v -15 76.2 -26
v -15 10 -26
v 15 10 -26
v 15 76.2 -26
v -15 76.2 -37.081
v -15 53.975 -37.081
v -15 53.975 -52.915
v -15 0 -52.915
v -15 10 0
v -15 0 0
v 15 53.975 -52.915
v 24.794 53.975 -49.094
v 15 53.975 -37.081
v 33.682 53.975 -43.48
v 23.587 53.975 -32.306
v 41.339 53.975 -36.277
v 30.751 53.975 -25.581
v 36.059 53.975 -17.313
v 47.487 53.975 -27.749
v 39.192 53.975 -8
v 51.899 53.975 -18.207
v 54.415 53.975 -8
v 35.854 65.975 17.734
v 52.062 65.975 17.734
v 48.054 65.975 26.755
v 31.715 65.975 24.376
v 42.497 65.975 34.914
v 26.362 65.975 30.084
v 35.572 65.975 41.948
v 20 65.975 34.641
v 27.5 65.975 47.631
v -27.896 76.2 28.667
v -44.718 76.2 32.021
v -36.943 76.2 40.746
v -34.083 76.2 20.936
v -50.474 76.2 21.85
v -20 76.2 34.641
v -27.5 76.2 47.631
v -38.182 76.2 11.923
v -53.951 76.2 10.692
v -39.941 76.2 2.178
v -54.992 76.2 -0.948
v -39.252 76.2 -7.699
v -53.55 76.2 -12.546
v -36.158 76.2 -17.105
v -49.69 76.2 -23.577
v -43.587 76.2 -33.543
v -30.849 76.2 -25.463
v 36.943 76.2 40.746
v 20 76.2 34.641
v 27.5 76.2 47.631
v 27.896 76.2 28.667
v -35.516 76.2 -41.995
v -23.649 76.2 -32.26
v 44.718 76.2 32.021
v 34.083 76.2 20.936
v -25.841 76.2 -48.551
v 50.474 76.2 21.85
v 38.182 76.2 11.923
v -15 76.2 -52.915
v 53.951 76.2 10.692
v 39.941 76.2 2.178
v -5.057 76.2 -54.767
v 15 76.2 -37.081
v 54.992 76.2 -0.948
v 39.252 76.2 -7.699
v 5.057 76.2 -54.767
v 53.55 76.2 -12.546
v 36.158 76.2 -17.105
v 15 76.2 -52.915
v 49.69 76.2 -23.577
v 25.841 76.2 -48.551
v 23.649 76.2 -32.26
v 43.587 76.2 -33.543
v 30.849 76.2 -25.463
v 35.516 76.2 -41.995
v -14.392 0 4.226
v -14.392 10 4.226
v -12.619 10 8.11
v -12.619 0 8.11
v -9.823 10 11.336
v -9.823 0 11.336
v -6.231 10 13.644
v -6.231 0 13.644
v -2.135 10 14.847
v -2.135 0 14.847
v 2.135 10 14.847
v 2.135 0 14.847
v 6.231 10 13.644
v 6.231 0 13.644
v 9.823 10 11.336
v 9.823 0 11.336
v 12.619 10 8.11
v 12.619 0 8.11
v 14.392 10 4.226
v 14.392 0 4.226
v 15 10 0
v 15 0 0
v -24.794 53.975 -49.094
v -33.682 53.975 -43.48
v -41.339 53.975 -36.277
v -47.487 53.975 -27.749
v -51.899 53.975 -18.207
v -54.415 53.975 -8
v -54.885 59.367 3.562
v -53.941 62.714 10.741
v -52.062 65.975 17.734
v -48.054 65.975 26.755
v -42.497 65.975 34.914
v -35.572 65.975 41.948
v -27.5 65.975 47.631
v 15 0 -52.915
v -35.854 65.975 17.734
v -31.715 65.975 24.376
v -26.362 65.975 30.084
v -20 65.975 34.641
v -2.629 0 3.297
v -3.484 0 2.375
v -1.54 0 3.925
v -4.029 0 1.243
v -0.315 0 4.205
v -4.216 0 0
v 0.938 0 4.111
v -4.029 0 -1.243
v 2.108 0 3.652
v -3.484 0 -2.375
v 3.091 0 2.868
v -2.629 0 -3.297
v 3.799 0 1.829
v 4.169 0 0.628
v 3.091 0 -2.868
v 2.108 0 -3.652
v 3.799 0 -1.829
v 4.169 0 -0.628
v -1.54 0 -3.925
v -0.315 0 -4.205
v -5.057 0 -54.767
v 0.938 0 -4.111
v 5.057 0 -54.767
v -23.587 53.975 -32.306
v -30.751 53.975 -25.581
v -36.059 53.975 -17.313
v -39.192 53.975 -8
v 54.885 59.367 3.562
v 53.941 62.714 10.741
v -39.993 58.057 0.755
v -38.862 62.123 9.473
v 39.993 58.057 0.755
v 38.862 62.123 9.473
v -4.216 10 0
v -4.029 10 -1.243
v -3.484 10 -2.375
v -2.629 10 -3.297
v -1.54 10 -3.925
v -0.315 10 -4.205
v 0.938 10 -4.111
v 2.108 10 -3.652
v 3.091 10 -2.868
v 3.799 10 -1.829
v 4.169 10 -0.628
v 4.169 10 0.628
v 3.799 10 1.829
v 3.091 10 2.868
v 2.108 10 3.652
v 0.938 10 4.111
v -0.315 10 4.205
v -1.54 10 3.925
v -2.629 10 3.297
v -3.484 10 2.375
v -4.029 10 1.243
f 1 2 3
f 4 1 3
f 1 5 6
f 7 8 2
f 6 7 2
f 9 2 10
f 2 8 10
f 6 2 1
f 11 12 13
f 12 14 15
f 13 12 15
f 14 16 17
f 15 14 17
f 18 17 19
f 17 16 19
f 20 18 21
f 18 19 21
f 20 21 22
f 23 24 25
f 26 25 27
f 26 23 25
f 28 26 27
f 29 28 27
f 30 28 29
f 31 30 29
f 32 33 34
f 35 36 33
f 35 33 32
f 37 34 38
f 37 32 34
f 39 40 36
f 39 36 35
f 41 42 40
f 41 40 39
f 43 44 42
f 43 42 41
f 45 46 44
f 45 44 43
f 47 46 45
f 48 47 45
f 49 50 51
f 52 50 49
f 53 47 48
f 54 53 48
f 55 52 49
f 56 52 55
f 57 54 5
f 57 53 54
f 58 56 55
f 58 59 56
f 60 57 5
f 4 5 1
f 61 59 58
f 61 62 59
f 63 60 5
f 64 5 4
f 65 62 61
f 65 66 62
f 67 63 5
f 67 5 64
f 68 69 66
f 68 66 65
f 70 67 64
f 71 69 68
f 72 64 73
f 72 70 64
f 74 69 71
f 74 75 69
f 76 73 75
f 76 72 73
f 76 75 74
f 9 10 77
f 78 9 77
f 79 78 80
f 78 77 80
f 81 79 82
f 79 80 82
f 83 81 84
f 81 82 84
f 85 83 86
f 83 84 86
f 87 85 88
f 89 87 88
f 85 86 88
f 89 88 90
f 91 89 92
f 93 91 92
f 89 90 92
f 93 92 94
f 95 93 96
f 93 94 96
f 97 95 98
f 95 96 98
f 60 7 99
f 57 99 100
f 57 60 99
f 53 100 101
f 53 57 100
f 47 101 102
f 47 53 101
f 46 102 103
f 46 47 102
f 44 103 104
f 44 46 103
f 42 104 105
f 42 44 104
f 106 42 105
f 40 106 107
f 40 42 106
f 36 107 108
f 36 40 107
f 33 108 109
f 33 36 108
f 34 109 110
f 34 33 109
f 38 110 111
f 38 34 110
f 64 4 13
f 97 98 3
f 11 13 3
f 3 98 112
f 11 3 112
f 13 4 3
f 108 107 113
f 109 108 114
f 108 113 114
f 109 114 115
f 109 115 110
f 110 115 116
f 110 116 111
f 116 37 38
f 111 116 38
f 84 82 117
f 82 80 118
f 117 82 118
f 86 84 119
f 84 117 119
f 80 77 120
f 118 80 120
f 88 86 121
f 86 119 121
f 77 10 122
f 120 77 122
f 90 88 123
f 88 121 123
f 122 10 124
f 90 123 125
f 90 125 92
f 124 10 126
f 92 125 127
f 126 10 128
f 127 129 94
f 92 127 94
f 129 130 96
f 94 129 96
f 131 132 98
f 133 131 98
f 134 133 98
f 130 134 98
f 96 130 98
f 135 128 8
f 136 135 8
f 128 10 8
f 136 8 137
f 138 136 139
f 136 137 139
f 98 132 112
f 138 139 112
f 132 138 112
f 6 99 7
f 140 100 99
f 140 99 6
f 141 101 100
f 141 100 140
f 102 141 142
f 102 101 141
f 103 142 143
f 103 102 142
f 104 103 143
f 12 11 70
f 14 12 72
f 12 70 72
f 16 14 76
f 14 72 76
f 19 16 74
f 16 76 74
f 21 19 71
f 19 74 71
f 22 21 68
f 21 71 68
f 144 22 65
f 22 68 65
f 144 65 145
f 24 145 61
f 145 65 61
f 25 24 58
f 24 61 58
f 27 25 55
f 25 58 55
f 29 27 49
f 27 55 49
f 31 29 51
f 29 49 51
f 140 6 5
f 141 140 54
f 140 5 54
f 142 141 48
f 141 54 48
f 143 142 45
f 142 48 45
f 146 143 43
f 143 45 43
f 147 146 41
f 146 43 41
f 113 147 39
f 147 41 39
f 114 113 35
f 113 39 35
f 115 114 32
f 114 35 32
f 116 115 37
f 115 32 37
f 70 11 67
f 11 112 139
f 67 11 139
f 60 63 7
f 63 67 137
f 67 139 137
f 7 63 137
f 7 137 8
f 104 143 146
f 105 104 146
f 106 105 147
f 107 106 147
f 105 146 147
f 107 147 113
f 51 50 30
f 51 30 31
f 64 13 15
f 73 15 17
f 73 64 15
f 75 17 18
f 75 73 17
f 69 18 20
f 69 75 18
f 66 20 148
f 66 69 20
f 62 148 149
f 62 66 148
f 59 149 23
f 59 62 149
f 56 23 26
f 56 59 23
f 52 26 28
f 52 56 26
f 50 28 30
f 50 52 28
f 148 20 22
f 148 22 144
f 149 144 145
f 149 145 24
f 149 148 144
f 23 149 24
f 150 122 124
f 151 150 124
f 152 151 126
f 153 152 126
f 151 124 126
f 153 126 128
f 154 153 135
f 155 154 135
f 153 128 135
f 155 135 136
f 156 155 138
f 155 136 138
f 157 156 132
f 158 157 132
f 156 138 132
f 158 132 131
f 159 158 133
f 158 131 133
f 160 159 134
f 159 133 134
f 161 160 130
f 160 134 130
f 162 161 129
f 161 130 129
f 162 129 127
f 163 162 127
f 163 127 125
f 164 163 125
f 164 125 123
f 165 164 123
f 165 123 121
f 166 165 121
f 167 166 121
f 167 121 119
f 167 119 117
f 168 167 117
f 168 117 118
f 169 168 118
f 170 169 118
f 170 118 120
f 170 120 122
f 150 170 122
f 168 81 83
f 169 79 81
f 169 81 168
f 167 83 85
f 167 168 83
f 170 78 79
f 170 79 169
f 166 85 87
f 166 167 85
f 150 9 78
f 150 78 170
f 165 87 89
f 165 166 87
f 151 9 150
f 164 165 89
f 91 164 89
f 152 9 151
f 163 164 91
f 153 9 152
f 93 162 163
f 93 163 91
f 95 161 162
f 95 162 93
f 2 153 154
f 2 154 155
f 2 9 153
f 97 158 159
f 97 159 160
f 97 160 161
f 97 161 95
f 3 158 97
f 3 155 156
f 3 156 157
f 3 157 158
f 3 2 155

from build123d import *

# Parameters (mm, degrees)
BOSS_EXTRUDE1_DEPTH     = 10
BOSS_EXTRUDE2_START     = -10
BOSS_EXTRUDE2_DEPTH     = 76.2
SKETCH3_W               = 15
SKETCH3_H               = 22.225
REVOLVE1_ANGLE          = 300
CUT_EXTRUDE1_DEPTH      = 56
CUT_EXTRUDE1_DEPTH_BACK = 56
F_3_8_24_TAPPED_HOLE1_D = 8.4328


with BuildPart() as part:
    # Sketch1 → Boss-Extrude1 (new body)
    with BuildSketch(Plane(origin=(0, 0, 0), x_dir=(1, 0, 0), z_dir=(0, 1, 0))):
        with BuildLine():
            Line((15, 0), (15, 52.915026221))
            ThreePointArc((15, 52.915026221), (0, 55), (-15, 52.915026221))
            Line((-15, 52.915026221), (-15, 0))
            ThreePointArc((-15, 0), (0, -15), (15, 0))
        make_face()
    extrude(amount=BOSS_EXTRUDE1_DEPTH)

    # Sketch2 → Boss-Extrude2 (add)
    with BuildSketch(Plane(origin=(0, 10, 0), x_dir=(1, 0, 0), z_dir=(0, 1, 0)).offset(BOSS_EXTRUDE2_START)):
        with BuildLine():
            Line((-15, 26), (15, 26))
            Line((15, 26), (15, 52.915026221))
            ThreePointArc((15, 52.915026221), (0, 55), (-15, 52.915026221))
            Line((-15, 52.915026221), (-15, 26))
        make_face()
    extrude(amount=BOSS_EXTRUDE2_DEPTH)

    # Sketch3 → Revolve1 (revolve, symmetric)
    with BuildSketch(Plane(origin=(0, 0, 0), x_dir=(0, 0, -1), z_dir=(1, 0, 0))) as revolve1_sk:
        with Locations((47.5, 65.0875)):
            Rectangle(SKETCH3_W, SKETCH3_H)
    revolve(axis=Axis((0, 80.01, 0), (0, -1, 0)), revolution_arc=REVOLVE1_ANGLE / 2)
    revolve(revolve1_sk.sketch, axis=Axis((0, 80.01, 0), (0, 1, 0)), revolution_arc=REVOLVE1_ANGLE / 2)

    # Sketch4 → Cut-Extrude1 (cut, two sides)
    with BuildSketch(Plane(origin=(0, 0, 0), x_dir=(0, 0, -1), z_dir=(1, 0, 0))) as cut_extrude1_sk:
        Polygon((8, 53.975), (-17.734083046, 65.975), (-47.631397208, 65.975), (-47.631397208, 53.975), align=None)
    extrude(amount=CUT_EXTRUDE1_DEPTH, mode=Mode.SUBTRACT)
    extrude(cut_extrude1_sk.sketch, amount=-CUT_EXTRUDE1_DEPTH_BACK, mode=Mode.SUBTRACT)

    # 3/8-24 Tapped Hole1 (through all)
    with Locations(Plane(origin=(0, 10, 0), x_dir=(1, 0, 0), z_dir=(0, 1, 0))):
        with Locations((0, 0)):
            Hole(F_3_8_24_TAPPED_HOLE1_D / 2)


solid = part.part
